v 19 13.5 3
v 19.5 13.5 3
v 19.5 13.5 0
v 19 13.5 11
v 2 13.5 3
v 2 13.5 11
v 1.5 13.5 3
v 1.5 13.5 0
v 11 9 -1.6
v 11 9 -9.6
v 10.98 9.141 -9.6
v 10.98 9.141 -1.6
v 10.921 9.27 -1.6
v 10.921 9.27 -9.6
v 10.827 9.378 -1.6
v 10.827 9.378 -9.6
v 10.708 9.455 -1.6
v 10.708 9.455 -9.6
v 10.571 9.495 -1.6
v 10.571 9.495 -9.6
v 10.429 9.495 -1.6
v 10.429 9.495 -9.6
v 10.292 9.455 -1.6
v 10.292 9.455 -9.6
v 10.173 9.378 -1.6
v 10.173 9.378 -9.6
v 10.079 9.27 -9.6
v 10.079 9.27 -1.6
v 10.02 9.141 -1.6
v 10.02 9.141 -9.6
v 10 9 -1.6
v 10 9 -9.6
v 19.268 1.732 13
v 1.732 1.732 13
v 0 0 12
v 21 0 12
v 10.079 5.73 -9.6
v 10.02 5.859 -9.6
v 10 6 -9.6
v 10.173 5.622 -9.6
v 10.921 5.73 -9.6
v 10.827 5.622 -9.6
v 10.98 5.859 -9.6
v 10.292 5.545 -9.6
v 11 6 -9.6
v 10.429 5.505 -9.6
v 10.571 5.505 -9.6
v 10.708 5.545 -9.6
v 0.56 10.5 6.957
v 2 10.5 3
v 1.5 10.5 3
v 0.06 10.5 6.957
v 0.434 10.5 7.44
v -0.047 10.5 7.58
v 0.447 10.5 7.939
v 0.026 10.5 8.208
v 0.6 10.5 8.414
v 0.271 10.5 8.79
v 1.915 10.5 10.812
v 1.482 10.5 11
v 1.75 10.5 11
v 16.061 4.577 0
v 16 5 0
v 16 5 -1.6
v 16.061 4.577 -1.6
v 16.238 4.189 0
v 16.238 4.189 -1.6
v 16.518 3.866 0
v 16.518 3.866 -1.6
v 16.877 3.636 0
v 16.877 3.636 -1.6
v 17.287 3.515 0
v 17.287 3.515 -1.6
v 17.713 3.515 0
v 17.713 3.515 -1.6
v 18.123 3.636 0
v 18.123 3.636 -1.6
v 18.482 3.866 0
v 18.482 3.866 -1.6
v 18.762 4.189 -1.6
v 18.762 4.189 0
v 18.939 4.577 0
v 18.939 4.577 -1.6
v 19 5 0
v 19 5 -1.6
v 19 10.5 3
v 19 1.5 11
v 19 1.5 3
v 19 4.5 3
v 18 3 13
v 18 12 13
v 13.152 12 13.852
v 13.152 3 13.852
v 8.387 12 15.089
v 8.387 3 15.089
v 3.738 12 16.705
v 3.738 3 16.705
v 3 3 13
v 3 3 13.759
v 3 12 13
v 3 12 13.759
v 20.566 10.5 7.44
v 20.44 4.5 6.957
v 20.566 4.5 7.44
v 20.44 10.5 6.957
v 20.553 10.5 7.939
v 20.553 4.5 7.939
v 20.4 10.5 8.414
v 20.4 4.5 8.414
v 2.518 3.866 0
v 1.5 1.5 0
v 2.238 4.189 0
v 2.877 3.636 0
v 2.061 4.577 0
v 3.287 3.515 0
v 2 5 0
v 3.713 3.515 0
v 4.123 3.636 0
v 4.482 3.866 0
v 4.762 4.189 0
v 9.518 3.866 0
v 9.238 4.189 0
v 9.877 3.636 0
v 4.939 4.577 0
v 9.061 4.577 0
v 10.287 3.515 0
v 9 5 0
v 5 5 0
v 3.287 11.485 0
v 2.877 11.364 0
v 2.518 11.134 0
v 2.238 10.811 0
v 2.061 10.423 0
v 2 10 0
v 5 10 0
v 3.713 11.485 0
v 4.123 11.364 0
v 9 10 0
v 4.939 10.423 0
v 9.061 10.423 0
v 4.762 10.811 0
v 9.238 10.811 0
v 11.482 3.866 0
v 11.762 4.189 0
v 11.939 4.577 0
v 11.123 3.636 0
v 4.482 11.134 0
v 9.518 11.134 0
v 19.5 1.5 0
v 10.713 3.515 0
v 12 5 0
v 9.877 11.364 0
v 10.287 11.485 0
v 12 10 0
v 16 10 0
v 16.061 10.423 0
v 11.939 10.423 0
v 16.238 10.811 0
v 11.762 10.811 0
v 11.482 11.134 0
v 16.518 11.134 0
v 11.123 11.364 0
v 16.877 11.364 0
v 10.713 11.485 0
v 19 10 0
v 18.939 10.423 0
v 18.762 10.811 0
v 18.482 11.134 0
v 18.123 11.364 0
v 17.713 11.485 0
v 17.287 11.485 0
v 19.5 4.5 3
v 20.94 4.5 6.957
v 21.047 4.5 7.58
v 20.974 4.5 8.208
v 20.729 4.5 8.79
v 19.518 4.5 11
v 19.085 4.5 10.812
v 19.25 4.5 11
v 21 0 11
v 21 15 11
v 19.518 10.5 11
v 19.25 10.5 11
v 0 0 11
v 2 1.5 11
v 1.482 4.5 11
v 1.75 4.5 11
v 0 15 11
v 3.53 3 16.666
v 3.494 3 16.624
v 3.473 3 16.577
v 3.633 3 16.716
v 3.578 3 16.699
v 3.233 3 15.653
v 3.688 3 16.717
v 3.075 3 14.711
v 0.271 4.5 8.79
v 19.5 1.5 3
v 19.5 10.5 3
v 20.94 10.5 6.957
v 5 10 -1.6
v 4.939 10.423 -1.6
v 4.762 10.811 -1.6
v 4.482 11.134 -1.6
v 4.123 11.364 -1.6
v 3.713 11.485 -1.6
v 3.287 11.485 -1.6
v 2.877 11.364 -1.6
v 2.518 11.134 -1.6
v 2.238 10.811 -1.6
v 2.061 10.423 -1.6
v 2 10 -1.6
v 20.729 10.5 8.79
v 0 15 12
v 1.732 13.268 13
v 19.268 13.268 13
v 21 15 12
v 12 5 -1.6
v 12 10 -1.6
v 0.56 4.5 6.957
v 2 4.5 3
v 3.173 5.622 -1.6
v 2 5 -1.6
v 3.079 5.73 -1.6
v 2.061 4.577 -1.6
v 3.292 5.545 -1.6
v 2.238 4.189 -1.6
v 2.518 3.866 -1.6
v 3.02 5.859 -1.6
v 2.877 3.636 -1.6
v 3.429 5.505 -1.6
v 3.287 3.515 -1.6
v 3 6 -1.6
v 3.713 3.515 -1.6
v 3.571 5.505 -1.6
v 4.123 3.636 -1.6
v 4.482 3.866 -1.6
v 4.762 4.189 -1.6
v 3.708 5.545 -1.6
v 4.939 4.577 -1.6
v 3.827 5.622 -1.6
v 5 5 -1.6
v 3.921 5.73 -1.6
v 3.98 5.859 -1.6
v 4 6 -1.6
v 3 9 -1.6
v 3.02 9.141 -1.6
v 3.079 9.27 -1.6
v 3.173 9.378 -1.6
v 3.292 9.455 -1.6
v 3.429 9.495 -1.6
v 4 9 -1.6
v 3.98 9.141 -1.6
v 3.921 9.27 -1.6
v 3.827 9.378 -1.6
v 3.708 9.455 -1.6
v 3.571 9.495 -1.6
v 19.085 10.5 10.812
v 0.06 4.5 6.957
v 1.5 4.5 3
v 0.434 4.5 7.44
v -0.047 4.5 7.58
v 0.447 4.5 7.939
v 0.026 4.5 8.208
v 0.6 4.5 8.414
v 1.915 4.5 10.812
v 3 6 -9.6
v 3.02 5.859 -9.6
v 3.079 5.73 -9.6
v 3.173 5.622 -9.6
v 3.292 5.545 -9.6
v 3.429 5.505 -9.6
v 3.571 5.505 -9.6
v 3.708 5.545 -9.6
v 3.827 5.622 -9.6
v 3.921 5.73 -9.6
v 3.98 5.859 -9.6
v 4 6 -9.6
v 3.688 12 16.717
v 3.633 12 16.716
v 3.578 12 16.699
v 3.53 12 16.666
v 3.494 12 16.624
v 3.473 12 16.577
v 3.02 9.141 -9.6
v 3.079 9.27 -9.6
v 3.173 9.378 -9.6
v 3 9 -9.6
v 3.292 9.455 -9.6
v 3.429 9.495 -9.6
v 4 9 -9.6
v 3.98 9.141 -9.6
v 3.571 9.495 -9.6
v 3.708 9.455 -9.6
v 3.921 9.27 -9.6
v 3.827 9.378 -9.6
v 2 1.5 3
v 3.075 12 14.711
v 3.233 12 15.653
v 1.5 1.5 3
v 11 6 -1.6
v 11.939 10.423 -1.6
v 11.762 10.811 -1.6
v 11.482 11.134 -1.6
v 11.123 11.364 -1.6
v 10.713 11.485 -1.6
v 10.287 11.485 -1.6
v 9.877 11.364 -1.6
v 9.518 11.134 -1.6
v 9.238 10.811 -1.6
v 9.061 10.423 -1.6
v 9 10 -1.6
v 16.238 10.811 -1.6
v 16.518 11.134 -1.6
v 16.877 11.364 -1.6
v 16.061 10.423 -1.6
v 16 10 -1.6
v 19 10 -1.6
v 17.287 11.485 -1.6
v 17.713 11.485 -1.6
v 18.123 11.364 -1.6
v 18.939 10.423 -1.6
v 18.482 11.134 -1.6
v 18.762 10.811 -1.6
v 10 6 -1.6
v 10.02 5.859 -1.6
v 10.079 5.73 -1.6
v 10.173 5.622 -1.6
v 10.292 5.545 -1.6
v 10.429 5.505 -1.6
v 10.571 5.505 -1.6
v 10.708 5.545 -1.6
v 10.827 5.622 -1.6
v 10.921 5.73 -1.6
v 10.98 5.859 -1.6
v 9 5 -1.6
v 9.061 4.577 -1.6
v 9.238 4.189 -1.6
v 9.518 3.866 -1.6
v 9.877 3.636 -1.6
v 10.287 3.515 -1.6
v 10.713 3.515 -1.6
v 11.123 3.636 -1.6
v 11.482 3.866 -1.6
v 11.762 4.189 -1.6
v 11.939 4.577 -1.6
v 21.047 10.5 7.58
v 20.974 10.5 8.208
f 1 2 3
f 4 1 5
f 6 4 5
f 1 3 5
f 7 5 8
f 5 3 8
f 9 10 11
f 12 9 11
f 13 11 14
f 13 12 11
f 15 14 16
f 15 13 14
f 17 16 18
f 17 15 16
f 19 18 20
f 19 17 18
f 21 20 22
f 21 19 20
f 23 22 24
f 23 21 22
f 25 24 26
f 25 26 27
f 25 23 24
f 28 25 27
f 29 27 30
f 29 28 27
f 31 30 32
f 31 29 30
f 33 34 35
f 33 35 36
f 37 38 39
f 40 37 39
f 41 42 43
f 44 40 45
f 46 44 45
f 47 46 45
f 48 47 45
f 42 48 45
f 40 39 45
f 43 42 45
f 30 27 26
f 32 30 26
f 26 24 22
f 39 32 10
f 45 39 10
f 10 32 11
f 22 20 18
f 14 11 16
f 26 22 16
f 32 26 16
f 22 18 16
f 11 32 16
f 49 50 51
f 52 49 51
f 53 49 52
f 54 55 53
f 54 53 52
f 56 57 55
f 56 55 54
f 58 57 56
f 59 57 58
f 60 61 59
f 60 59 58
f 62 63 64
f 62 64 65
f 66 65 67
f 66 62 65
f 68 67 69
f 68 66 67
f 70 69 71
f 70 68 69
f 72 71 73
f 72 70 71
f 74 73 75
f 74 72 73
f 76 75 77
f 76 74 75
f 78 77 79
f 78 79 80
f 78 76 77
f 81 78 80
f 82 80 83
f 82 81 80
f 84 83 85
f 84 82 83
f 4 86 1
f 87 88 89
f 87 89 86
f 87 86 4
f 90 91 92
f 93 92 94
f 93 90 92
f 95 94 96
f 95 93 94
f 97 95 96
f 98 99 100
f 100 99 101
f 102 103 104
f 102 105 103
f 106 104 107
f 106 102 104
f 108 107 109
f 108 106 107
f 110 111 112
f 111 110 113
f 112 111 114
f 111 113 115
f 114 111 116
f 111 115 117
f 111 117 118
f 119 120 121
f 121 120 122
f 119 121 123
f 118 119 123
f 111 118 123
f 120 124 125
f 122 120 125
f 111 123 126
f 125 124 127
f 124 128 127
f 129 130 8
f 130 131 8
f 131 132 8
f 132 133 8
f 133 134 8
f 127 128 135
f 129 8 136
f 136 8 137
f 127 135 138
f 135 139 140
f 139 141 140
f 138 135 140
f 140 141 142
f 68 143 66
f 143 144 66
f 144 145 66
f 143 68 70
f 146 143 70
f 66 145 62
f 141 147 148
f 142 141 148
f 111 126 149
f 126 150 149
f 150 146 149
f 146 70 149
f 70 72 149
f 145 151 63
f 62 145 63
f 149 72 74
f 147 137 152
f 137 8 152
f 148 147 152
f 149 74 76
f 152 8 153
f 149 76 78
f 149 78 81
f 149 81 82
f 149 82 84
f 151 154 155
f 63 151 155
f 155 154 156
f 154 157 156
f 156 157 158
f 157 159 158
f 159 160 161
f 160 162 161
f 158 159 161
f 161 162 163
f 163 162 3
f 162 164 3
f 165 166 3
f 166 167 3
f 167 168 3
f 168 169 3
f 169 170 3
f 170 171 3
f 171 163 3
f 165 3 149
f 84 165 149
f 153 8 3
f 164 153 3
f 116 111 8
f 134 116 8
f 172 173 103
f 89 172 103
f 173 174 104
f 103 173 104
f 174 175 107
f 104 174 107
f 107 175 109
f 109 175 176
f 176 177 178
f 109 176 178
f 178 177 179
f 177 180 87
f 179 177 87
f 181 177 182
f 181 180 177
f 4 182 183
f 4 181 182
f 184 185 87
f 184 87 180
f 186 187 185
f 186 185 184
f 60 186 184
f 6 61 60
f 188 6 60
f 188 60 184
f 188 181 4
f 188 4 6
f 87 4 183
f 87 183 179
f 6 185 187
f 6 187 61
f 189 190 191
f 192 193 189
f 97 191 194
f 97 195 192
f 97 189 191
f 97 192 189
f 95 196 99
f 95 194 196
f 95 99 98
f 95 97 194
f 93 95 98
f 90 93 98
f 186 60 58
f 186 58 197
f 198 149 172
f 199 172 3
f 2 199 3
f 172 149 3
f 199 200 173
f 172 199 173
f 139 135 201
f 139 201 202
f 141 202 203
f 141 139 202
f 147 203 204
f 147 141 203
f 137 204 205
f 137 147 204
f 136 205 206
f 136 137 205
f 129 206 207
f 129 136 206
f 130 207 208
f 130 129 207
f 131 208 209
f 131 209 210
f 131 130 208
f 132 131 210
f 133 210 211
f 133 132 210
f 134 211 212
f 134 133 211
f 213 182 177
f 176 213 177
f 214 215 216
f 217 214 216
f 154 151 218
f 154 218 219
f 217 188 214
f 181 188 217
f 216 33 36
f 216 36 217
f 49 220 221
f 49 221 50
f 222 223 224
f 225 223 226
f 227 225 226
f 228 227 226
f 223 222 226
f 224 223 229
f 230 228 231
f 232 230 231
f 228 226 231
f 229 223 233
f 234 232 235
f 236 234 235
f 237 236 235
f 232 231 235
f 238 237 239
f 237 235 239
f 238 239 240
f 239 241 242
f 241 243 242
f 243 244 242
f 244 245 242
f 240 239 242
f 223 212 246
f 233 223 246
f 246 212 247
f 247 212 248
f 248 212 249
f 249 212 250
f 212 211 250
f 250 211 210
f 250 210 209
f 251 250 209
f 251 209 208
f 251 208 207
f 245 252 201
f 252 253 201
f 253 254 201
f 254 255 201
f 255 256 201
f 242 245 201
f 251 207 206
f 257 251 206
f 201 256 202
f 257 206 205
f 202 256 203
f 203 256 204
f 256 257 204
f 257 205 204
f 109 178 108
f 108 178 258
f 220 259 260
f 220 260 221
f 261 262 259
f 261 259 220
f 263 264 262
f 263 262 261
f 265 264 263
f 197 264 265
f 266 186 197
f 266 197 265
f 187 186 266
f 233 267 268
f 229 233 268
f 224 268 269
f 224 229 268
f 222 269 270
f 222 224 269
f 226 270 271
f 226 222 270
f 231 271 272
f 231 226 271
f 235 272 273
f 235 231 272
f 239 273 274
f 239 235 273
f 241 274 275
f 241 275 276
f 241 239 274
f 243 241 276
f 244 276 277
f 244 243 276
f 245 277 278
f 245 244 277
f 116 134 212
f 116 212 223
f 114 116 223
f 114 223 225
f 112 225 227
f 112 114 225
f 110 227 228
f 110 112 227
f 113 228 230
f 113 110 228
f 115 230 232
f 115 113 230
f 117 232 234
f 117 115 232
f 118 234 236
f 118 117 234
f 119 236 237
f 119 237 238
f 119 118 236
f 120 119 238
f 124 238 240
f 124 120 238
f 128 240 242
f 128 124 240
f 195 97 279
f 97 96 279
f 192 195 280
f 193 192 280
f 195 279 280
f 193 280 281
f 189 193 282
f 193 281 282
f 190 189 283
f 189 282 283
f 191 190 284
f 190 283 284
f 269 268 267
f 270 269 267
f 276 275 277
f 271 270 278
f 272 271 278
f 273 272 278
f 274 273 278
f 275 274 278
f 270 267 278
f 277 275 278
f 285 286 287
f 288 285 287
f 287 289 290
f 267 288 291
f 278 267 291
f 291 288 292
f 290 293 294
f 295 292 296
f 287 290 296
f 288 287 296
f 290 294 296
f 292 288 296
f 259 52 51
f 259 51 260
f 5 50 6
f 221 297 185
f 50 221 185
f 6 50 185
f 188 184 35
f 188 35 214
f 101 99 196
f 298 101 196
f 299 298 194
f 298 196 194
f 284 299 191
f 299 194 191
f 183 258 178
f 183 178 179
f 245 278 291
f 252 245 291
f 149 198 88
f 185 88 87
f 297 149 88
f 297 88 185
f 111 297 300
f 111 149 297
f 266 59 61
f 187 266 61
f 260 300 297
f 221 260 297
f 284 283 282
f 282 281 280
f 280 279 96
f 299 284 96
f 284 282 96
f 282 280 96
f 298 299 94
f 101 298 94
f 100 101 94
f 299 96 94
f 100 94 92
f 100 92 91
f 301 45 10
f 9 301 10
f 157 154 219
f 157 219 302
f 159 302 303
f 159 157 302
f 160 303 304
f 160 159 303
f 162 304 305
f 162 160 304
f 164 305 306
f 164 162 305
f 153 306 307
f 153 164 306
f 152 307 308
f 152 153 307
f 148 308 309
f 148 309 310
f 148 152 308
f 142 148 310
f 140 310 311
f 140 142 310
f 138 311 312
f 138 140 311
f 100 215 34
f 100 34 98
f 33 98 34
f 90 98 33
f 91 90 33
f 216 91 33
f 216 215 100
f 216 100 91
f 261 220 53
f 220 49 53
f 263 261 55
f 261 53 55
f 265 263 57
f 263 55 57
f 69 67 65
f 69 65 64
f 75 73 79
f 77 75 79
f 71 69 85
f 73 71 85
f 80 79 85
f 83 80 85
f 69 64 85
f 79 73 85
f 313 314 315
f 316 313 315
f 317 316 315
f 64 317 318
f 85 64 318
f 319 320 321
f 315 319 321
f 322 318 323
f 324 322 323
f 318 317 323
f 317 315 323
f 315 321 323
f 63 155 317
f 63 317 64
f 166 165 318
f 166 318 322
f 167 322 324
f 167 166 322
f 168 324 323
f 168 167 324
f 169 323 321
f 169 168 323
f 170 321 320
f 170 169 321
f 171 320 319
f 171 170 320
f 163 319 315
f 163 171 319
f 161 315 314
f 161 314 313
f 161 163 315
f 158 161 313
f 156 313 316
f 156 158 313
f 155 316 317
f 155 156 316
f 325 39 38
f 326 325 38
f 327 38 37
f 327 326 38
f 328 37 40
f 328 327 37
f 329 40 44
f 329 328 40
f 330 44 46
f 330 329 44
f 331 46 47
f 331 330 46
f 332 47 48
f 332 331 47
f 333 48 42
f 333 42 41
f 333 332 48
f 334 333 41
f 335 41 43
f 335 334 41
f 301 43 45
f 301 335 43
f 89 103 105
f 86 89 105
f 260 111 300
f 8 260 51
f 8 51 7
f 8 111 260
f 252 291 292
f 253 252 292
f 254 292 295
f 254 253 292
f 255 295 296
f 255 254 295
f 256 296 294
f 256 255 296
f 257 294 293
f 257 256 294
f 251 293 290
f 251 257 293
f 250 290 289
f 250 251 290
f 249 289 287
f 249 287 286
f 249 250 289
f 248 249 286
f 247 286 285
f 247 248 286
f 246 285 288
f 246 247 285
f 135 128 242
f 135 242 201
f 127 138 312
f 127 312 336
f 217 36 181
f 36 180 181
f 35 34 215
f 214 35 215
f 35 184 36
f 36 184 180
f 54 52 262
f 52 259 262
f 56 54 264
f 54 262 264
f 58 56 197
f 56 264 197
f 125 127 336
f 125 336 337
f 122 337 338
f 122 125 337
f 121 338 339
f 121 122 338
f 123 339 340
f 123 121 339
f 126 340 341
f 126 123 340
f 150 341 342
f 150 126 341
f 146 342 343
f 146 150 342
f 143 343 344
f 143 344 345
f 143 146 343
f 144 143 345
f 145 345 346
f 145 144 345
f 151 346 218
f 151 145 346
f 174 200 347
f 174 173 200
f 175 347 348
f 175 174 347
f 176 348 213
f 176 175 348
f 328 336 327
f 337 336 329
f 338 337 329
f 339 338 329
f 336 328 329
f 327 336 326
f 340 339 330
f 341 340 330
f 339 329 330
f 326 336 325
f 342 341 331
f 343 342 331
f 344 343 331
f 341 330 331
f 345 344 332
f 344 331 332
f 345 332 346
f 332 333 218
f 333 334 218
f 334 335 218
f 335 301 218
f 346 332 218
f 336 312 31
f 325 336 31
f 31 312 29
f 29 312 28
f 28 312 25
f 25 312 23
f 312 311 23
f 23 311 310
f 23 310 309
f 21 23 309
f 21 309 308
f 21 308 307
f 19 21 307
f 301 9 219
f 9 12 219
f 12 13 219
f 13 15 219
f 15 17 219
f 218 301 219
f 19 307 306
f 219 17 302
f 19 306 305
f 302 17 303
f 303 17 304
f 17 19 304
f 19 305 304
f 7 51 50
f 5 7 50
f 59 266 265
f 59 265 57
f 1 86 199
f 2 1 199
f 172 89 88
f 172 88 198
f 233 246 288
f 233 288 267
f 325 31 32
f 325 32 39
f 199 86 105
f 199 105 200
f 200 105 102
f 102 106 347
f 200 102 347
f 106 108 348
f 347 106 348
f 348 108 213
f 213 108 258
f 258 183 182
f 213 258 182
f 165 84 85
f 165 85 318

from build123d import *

# Parameters (mm, degrees)
SKETCH_1_W             = 21
SKETCH_1_H             = 15
EXTRUDE_1_DEPTH        = 17
SKETCH_3_OUTSIDE_W     = 29.18
SKETCH_3_OUTSIDE_H     = 23.18
SKETCH_3_OUTSIDE_W_2   = 18
SKETCH_3_OUTSIDE_H_2   = 12
CUT_EXTRUDE_1_DEPTH    = 11
SKETCH_4_OUTSIDE_W     = 29.18
SKETCH_4_OUTSIDE_H     = 23.18
SKETCH_4_OUTSIDE_W_2   = 15
SKETCH_4_OUTSIDE_H_2   = 9
CUT_EXTRUDE_2_DEPTH    = 4
CUT_EXTRUDE_3_REACH    = 14
CUT_EXTRUDE_4_REACH    = 14
FILLET_2_R             = 0.2
CHAMFER_1_SIZE         = 1
CHAMFER_1_SIZE2        = 1.732050808
CHAMFER_1_PART_2_SIZE  = 1
CHAMFER_1_PART_2_SIZE2 = 1.732050808
CHAMFER_1_PART_3_SIZE  = 1
CHAMFER_1_PART_3_SIZE2 = 1.732050808
CHAMFER_1_PART_4_SIZE  = 1
CHAMFER_1_PART_4_SIZE2 = 1.732050808
CUT_EXTRUDE_5_REACH    = 15.5
SKETCH_7_W             = 3.215432019
SKETCH_7_H             = 8
SKETCH_8_W             = 0.5
SKETCH_8_H             = 6
EXTRUDE_2_DEPTH        = 1.6
EXTRUDE_3_DEPTH        = 8
PATTERN_LINEAR_2_COUNT = 3
PATTERN_LINEAR_2_PITCH = 7
PATTERN_LINEAR_3_COUNT = 2
PATTERN_LINEAR_3_PITCH = 7


with BuildPart() as part:
    # 草图1 → 凸台-拉伸1 (new body)
    with BuildSketch(Plane.XY):
        with Locations((10.5, 7.5)):
            Rectangle(SKETCH_1_W, SKETCH_1_H)
    extrude(amount=EXTRUDE_1_DEPTH)

    # 草图3 outside → 切除-拉伸1 (cut)
    with BuildSketch(Plane(origin=(0, 0, 0), x_dir=(-1, 0, 0), z_dir=(0, 0, -1))):
        with Locations((-10.5, 7.5)):
            Rectangle(SKETCH_3_OUTSIDE_W, SKETCH_3_OUTSIDE_H)
        with Locations((-10.5, 7.5)):
            Rectangle(SKETCH_3_OUTSIDE_W_2, SKETCH_3_OUTSIDE_H_2, mode=Mode.SUBTRACT)
    extrude(amount=-CUT_EXTRUDE_1_DEPTH, mode=Mode.SUBTRACT)

    # 草图4 outside → 切除-拉伸2 (cut)
    with BuildSketch(Plane.XY.offset(17)):
        with Locations((10.5, 7.5)):
            Rectangle(SKETCH_4_OUTSIDE_W, SKETCH_4_OUTSIDE_H)
        with Locations((10.5, 7.5)):
            Rectangle(SKETCH_4_OUTSIDE_W_2, SKETCH_4_OUTSIDE_H_2, mode=Mode.SUBTRACT)
    extrude(amount=-CUT_EXTRUDE_2_DEPTH, mode=Mode.SUBTRACT)

    # 草图5 → 切除-拉伸3 (cut, up to next)
    with BuildSketch(Plane.XZ.offset(-3), mode=Mode.PRIVATE) as cut_extrude_3_sk1:
        with BuildLine():
            Line((3, 17), (3.786081295, 18.926671419))
            Line((3.786081295, 18.926671419), (19.848042348, 18.643435221))
            Line((19.848042348, 18.643435221), (18, 13))
            ThreePointArc((18, 13), (10.37304874, 14.523932773), (3, 17))
        make_face()
    cut_extrude_3_tool1 = extrude(cut_extrude_3_sk1.sketch, amount=-CUT_EXTRUDE_3_REACH, mode=Mode.PRIVATE) & part.part
    add(cut_extrude_3_tool1.solids().sort_by_distance((12.266887, 3, 16.568518))[0], mode=Mode.SUBTRACT)

    # 草图6 → 切除-拉伸4 (cut, up to next)
    with BuildSketch(Plane.XZ.offset(-3), mode=Mode.PRIVATE) as cut_extrude_4_sk1:
        with BuildLine():
            Line((3.538726555, 16.783166359), (1.834472807, 18.259535343))
            Line((1.834472807, 18.259535343), (1.834472807, 13.545763946))
            Line((1.834472807, 13.545763946), (3, 13))
            ThreePointArc((3, 13), (3.102200266, 14.915387354), (3.538726555, 16.783166359))
        make_face()
    cut_extrude_4_tool1 = extrude(cut_extrude_4_sk1.sketch, amount=-CUT_EXTRUDE_4_REACH, mode=Mode.PRIVATE) & part.part
    add(cut_extrude_4_tool1.solids().sort_by_distance((2.498394, 3, 15.595743))[0], mode=Mode.SUBTRACT)

    # 圆角2
    fillet_2_edges = [part.edges().sort_by_distance(p)[0] for p in [
        (3.538726555, 7.5, 16.783166359),
    ]]
    fillet(fillet_2_edges, radius=FILLET_2_R)

    # 倒角1
    chamfer_1_edges = [part.edges().sort_by_distance(p)[0] for p in [
        (10.5, 15, 13),
    ]]
    chamfer_1_side = [part.faces().sort_by_distance(p)[0] for p in [
        (10.5, 15, 12),
    ]]
    chamfer(chamfer_1_edges, length=CHAMFER_1_SIZE, length2=CHAMFER_1_SIZE2, reference=chamfer_1_side[0])

    # 倒角1 part 2
    chamfer_1_part_2_edges = [part.edges().sort_by_distance(p)[0] for p in [
        (0, 7.5, 13),
    ]]
    chamfer_1_part_2_side = [part.faces().sort_by_distance(p)[0] for p in [
        (0, 7.5, 12),
    ]]
    chamfer(chamfer_1_part_2_edges, length=CHAMFER_1_PART_2_SIZE, length2=CHAMFER_1_PART_2_SIZE2, reference=chamfer_1_part_2_side[0])

    # 倒角1 part 3
    chamfer_1_part_3_edges = [part.edges().sort_by_distance(p)[0] for p in [
        (10.5, 0, 13),
    ]]
    chamfer_1_part_3_side = [part.faces().sort_by_distance(p)[0] for p in [
        (10.5, 0, 12),
    ]]
    chamfer(chamfer_1_part_3_edges, length=CHAMFER_1_PART_3_SIZE, length2=CHAMFER_1_PART_3_SIZE2, reference=chamfer_1_part_3_side[0])

    # 倒角1 part 4
    chamfer_1_part_4_edges = [part.edges().sort_by_distance(p)[0] for p in [
        (21, 7.5, 13),
    ]]
    chamfer_1_part_4_side = [part.faces().sort_by_distance(p)[0] for p in [
        (21, 7.5, 12),
    ]]
    chamfer(chamfer_1_part_4_edges, length=CHAMFER_1_PART_4_SIZE, length2=CHAMFER_1_PART_4_SIZE2, reference=chamfer_1_part_4_side[0])

    # 草图7 → 切除-拉伸5 (cut, up to next)
    with BuildSketch(Plane.XZ.offset(-1.5), mode=Mode.PRIVATE) as cut_extrude_5_sk1:
        with Locations((0.39228399, 7)):
            Rectangle(SKETCH_7_W, SKETCH_7_H)
    cut_extrude_5_tool1 = extrude(cut_extrude_5_sk1.sketch, amount=-CUT_EXTRUDE_5_REACH, mode=Mode.PRIVATE) & part.part
    add(cut_extrude_5_tool1.solids().sort_by_distance((0.392284, 1.5, 7))[0], mode=Mode.SUBTRACT)
    # 草图7 → 切除-拉伸5 (cut, up to next)
    with BuildSketch(Plane.XZ.offset(-1.5), mode=Mode.PRIVATE) as cut_extrude_5_sk2:
        with Locations((20.60771601, 7)):
            Rectangle(SKETCH_7_W, SKETCH_7_H)
    cut_extrude_5_tool2 = extrude(cut_extrude_5_sk2.sketch, amount=-CUT_EXTRUDE_5_REACH, mode=Mode.PRIVATE) & part.part
    add(cut_extrude_5_tool2.solids().sort_by_distance((20.607716, 1.5, 7))[0], mode=Mode.SUBTRACT)

    # 扫描1: sweep along a path in 草图9
    with BuildLine(Plane(origin=(0, 7.5, 0), x_dir=(-1, 0, 0), z_dir=(0, -1, 0))) as sweep_1_path:
        Line((-1.75, -3), (-0.309821019, -6.95685923))
        ThreePointArc((-0.309821019, -6.95685923), (-0.195012991, -7.793192673), (-0.4354877, -8.602393776))
        Line((-0.4354877, -8.602393776), (-1.75, -11))
    # 草图8 → 扫描1 (sweep)
    with BuildSketch(Plane.XY.offset(3)):
        with Locations((1.75, 7.5)):
            Rectangle(SKETCH_8_W, SKETCH_8_H)
    sweep_1 = sweep(path=sweep_1_path.line)

    # 镜向1: 扫描1 across plane
    add(sweep_1.mirror(Plane(origin=(10.5, 0, 0), x_dir=(0, 0, 1), z_dir=(1, 0, 0))))

    # 草图10 → 凸台-拉伸2 (add)
    with BuildSketch(Plane(origin=(0, 0, 0), x_dir=(-1, 0, 0), z_dir=(0, 0, -1))):
        with BuildLine():
            Line((-5, 5), (-5, 10))
            ThreePointArc((-5, 10), (-3.5, 11.5), (-2, 10))
            Line((-2, 10), (-2, 5))
            ThreePointArc((-2, 5), (-3.5, 3.5), (-5, 5))
        make_face()
    extrude_2 = extrude(amount=EXTRUDE_2_DEPTH)

    # 草图11 → 凸台-拉伸3 (add)
    with BuildSketch(Plane(origin=(0, 0, -1.6), x_dir=(-1, 0, 0), z_dir=(0, 0, -1))):
        with BuildLine():
            Line((-4, 6), (-4, 9))
            ThreePointArc((-4, 9), (-3.5, 9.5), (-3, 9))
            Line((-3, 9), (-3, 6))
            ThreePointArc((-3, 6), (-3.5, 5.5), (-4, 6))
        make_face()
    extrude_3 = extrude(amount=EXTRUDE_3_DEPTH)

    # 阵列(线性)2: 凸台-拉伸2 ×3
    with Locations(*[(i * PATTERN_LINEAR_2_PITCH, 0, 0) for i in range(1, PATTERN_LINEAR_2_COUNT)]):
        add(extrude_2)

    # 阵列(线性)3: 凸台-拉伸3 ×2
    with Locations(*[(i * PATTERN_LINEAR_3_PITCH, 0, 0) for i in range(1, PATTERN_LINEAR_3_COUNT)]):
        add(extrude_3)


solid = part.part
